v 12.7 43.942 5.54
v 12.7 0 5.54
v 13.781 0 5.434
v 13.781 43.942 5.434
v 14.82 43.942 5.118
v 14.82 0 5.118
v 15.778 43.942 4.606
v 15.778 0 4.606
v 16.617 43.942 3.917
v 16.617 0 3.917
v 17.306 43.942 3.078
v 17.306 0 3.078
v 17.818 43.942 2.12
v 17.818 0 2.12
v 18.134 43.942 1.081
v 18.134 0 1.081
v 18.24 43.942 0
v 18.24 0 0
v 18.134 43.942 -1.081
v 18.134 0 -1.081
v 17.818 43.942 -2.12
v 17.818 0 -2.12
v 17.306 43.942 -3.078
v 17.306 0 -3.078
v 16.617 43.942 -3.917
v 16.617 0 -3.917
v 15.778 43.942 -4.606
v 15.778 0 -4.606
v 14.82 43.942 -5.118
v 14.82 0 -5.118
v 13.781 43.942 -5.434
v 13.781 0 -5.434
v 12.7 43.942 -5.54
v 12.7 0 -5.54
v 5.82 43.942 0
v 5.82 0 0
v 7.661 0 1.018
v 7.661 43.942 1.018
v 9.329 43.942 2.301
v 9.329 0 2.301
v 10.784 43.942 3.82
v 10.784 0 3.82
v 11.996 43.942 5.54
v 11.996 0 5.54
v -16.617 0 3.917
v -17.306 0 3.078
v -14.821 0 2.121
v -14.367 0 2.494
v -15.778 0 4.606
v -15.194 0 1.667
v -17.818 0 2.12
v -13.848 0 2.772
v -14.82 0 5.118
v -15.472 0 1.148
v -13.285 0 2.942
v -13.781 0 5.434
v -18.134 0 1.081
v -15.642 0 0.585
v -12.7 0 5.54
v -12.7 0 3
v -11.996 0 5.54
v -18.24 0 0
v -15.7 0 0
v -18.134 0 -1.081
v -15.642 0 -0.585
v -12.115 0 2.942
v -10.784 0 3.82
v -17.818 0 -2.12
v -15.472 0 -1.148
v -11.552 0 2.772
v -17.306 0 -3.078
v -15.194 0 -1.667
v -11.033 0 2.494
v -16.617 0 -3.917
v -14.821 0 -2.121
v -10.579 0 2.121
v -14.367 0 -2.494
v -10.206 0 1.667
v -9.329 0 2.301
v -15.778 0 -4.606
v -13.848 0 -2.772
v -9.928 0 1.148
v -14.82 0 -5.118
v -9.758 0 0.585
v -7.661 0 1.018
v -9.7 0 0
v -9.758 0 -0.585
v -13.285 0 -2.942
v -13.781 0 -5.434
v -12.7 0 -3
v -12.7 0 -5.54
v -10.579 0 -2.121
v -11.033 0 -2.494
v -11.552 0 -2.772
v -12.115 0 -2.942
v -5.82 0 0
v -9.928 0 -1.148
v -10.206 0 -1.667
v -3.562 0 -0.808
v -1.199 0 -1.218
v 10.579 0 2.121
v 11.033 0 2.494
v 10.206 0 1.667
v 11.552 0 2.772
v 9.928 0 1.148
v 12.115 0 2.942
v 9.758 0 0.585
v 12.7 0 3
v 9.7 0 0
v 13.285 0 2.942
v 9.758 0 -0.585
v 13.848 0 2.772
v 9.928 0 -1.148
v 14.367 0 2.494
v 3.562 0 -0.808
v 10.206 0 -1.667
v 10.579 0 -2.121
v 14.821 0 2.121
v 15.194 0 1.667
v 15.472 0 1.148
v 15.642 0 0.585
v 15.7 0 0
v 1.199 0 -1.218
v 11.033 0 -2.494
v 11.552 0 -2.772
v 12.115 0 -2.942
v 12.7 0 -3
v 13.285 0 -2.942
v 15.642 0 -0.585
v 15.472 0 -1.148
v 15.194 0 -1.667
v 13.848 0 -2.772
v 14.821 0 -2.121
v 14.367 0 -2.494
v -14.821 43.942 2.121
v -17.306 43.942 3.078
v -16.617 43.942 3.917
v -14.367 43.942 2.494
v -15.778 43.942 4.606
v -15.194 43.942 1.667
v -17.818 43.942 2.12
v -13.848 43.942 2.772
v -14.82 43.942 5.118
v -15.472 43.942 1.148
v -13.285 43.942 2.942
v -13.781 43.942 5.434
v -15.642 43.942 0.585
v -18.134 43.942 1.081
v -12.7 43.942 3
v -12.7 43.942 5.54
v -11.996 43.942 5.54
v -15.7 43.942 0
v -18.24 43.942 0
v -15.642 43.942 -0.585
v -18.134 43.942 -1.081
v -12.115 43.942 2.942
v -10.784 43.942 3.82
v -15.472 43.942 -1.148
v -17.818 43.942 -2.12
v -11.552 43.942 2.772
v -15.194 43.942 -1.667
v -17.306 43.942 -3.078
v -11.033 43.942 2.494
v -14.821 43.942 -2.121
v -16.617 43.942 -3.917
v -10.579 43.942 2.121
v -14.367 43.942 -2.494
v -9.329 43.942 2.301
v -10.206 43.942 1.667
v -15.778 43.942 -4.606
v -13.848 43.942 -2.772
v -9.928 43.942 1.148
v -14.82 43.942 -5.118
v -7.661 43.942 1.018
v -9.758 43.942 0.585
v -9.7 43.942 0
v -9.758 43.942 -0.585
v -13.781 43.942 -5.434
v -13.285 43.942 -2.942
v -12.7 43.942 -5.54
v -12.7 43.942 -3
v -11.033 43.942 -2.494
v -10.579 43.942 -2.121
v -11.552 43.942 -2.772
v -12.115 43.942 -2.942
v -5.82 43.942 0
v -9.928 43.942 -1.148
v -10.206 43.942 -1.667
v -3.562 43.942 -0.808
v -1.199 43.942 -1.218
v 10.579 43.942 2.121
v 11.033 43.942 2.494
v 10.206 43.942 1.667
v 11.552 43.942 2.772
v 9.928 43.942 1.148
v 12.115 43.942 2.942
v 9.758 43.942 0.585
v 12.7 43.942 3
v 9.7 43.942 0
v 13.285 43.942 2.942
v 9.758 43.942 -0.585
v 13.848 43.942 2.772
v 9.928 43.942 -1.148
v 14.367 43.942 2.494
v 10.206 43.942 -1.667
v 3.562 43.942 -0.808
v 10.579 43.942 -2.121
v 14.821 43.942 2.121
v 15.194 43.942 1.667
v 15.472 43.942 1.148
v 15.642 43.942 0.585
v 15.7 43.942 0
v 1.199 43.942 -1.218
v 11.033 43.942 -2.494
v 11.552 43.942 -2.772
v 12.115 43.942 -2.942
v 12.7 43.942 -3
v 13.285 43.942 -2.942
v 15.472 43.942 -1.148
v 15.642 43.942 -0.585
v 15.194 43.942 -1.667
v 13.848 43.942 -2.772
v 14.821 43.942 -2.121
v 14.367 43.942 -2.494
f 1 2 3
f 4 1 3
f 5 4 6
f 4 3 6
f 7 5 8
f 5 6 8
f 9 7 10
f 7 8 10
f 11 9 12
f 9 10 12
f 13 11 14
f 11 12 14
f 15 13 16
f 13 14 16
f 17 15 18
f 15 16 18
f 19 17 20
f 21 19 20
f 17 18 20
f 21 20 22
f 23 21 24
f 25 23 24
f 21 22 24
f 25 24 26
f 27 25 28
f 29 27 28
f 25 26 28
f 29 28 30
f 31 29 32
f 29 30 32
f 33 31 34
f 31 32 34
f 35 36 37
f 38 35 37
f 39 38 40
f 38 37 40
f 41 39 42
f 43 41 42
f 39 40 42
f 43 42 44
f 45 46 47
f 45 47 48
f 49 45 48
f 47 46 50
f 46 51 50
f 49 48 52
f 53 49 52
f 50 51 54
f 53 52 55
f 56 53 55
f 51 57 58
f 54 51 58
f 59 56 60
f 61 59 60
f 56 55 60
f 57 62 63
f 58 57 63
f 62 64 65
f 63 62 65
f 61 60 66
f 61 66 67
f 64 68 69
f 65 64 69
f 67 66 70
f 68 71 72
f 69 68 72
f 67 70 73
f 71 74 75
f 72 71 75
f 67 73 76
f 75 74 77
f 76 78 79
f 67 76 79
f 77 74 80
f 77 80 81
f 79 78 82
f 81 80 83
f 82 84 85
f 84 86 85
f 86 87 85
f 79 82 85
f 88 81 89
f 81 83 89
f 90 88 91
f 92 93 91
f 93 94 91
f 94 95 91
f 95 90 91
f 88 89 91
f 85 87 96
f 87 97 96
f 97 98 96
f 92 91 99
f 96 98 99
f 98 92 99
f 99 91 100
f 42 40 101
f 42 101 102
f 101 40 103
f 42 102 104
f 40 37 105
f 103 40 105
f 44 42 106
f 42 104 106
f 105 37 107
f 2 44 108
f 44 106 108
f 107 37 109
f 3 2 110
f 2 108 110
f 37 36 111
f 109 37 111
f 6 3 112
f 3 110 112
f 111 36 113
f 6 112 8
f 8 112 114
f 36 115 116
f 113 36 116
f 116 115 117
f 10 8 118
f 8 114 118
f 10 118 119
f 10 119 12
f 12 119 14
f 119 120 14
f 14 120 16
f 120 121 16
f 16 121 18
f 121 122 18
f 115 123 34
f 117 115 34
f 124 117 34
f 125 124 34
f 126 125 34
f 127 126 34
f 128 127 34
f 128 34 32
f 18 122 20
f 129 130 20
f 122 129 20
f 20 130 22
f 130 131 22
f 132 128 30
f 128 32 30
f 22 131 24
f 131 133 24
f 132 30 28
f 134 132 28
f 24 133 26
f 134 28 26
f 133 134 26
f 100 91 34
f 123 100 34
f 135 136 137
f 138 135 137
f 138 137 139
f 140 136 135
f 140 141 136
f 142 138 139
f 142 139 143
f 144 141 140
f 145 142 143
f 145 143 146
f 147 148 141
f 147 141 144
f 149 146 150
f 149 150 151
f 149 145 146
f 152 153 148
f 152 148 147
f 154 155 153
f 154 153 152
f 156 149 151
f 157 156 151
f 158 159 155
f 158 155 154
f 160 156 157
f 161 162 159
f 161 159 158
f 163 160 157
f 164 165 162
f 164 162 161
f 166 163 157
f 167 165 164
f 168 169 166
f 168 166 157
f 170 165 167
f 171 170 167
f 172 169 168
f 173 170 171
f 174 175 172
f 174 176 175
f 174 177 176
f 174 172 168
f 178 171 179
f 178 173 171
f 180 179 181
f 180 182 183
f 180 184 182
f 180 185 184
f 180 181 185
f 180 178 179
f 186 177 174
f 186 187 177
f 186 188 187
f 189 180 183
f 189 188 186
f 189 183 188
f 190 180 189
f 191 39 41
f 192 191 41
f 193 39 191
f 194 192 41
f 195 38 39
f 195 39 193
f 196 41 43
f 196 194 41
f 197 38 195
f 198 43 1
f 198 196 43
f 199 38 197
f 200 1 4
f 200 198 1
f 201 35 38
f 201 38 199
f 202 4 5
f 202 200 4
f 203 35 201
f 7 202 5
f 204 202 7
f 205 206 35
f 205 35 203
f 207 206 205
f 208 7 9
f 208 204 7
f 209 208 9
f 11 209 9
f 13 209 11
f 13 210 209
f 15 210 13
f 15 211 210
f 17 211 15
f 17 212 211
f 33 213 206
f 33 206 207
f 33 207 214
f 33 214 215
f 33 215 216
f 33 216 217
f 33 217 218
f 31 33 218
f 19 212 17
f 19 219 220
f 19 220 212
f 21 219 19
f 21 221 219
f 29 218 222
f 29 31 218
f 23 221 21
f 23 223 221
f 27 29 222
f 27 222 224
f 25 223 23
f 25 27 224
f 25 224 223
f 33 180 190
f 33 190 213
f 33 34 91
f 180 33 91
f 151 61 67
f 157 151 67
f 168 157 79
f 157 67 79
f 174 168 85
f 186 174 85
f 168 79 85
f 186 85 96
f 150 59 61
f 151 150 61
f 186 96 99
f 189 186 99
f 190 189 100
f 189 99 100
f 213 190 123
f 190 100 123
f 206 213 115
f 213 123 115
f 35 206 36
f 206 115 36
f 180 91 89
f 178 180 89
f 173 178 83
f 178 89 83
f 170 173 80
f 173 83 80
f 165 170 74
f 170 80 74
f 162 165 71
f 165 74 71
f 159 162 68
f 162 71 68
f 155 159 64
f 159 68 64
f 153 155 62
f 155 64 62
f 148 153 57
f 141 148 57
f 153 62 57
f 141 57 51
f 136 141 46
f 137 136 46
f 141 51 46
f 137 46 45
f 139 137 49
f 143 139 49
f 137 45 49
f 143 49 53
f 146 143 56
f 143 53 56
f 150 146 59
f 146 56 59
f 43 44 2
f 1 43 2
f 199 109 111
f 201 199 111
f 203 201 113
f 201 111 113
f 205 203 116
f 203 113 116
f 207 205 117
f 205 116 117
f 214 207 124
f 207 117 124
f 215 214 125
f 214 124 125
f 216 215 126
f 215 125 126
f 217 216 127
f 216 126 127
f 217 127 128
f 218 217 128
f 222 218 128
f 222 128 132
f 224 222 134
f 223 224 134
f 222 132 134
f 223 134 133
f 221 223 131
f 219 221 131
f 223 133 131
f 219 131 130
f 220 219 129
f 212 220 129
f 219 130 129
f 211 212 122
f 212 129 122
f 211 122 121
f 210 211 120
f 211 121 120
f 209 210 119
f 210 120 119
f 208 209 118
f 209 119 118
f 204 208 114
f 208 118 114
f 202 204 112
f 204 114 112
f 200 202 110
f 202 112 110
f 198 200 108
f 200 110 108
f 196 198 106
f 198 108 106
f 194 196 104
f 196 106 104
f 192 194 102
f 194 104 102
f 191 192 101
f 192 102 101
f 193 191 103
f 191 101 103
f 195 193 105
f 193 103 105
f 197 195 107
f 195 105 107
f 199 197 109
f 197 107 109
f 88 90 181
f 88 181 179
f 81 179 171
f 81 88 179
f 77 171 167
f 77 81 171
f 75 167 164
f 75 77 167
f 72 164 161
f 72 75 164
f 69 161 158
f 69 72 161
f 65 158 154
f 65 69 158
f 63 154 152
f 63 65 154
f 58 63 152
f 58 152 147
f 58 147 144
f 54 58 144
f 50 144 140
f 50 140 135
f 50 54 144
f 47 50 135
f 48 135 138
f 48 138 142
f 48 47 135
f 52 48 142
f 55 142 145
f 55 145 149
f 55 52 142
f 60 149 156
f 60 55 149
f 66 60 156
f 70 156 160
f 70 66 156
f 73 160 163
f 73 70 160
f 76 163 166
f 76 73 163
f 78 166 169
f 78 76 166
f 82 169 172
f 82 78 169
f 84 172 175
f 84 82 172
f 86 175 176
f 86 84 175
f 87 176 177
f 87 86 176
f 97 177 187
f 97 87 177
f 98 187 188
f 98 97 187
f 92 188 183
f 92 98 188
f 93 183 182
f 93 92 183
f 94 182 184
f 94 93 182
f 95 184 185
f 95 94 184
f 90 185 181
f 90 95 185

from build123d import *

# Parameters (mm, degrees)
SKETCH1_R           = 3
BOSS_EXTRUDE1_DEPTH = 43.942


with BuildPart() as part:
    # Sketch1 → Boss-Extrude1 (new body)
    with BuildSketch(Plane(origin=(0, 0, 0), x_dir=(1, 0, 0), z_dir=(0, 1, 0))):
        with BuildLine():
            ThreePointArc((-11.995636707, -5.54), (-9.328503626, -2.300965424), (-5.819871132, 0))
            ThreePointArc((-5.819871132, 0), (0, 1.27), (5.819871133, 0))
            ThreePointArc((5.819871133, 0), (9.328503626, -2.300965424), (11.995636707, -5.54))
            Line((11.995636707, -5.54), (12.7, -5.54))
            ThreePointArc((12.7, -5.54), (18.24, 0), (12.7, 5.54))
            Line((12.7, 5.54), (-12.7, 5.54))
            ThreePointArc((-12.7, 5.54), (-18.24, 0), (-12.7, -5.54))
            Line((-12.7, -5.54), (-11.995636707, -5.54))
        make_face()
        with Locations(Location((-12.7, 0, 0), (0, 0, 90))):
            Circle(SKETCH1_R, mode=Mode.SUBTRACT)
        with BuildLine():
            ThreePointArc((15.7, 0), (12.7, -3), (9.7, 0))
            ThreePointArc((9.7, 0), (12.7, 3), (15.7, 0))
        make_face(mode=Mode.SUBTRACT)
    extrude(amount=BOSS_EXTRUDE1_DEPTH)


solid = part.part
